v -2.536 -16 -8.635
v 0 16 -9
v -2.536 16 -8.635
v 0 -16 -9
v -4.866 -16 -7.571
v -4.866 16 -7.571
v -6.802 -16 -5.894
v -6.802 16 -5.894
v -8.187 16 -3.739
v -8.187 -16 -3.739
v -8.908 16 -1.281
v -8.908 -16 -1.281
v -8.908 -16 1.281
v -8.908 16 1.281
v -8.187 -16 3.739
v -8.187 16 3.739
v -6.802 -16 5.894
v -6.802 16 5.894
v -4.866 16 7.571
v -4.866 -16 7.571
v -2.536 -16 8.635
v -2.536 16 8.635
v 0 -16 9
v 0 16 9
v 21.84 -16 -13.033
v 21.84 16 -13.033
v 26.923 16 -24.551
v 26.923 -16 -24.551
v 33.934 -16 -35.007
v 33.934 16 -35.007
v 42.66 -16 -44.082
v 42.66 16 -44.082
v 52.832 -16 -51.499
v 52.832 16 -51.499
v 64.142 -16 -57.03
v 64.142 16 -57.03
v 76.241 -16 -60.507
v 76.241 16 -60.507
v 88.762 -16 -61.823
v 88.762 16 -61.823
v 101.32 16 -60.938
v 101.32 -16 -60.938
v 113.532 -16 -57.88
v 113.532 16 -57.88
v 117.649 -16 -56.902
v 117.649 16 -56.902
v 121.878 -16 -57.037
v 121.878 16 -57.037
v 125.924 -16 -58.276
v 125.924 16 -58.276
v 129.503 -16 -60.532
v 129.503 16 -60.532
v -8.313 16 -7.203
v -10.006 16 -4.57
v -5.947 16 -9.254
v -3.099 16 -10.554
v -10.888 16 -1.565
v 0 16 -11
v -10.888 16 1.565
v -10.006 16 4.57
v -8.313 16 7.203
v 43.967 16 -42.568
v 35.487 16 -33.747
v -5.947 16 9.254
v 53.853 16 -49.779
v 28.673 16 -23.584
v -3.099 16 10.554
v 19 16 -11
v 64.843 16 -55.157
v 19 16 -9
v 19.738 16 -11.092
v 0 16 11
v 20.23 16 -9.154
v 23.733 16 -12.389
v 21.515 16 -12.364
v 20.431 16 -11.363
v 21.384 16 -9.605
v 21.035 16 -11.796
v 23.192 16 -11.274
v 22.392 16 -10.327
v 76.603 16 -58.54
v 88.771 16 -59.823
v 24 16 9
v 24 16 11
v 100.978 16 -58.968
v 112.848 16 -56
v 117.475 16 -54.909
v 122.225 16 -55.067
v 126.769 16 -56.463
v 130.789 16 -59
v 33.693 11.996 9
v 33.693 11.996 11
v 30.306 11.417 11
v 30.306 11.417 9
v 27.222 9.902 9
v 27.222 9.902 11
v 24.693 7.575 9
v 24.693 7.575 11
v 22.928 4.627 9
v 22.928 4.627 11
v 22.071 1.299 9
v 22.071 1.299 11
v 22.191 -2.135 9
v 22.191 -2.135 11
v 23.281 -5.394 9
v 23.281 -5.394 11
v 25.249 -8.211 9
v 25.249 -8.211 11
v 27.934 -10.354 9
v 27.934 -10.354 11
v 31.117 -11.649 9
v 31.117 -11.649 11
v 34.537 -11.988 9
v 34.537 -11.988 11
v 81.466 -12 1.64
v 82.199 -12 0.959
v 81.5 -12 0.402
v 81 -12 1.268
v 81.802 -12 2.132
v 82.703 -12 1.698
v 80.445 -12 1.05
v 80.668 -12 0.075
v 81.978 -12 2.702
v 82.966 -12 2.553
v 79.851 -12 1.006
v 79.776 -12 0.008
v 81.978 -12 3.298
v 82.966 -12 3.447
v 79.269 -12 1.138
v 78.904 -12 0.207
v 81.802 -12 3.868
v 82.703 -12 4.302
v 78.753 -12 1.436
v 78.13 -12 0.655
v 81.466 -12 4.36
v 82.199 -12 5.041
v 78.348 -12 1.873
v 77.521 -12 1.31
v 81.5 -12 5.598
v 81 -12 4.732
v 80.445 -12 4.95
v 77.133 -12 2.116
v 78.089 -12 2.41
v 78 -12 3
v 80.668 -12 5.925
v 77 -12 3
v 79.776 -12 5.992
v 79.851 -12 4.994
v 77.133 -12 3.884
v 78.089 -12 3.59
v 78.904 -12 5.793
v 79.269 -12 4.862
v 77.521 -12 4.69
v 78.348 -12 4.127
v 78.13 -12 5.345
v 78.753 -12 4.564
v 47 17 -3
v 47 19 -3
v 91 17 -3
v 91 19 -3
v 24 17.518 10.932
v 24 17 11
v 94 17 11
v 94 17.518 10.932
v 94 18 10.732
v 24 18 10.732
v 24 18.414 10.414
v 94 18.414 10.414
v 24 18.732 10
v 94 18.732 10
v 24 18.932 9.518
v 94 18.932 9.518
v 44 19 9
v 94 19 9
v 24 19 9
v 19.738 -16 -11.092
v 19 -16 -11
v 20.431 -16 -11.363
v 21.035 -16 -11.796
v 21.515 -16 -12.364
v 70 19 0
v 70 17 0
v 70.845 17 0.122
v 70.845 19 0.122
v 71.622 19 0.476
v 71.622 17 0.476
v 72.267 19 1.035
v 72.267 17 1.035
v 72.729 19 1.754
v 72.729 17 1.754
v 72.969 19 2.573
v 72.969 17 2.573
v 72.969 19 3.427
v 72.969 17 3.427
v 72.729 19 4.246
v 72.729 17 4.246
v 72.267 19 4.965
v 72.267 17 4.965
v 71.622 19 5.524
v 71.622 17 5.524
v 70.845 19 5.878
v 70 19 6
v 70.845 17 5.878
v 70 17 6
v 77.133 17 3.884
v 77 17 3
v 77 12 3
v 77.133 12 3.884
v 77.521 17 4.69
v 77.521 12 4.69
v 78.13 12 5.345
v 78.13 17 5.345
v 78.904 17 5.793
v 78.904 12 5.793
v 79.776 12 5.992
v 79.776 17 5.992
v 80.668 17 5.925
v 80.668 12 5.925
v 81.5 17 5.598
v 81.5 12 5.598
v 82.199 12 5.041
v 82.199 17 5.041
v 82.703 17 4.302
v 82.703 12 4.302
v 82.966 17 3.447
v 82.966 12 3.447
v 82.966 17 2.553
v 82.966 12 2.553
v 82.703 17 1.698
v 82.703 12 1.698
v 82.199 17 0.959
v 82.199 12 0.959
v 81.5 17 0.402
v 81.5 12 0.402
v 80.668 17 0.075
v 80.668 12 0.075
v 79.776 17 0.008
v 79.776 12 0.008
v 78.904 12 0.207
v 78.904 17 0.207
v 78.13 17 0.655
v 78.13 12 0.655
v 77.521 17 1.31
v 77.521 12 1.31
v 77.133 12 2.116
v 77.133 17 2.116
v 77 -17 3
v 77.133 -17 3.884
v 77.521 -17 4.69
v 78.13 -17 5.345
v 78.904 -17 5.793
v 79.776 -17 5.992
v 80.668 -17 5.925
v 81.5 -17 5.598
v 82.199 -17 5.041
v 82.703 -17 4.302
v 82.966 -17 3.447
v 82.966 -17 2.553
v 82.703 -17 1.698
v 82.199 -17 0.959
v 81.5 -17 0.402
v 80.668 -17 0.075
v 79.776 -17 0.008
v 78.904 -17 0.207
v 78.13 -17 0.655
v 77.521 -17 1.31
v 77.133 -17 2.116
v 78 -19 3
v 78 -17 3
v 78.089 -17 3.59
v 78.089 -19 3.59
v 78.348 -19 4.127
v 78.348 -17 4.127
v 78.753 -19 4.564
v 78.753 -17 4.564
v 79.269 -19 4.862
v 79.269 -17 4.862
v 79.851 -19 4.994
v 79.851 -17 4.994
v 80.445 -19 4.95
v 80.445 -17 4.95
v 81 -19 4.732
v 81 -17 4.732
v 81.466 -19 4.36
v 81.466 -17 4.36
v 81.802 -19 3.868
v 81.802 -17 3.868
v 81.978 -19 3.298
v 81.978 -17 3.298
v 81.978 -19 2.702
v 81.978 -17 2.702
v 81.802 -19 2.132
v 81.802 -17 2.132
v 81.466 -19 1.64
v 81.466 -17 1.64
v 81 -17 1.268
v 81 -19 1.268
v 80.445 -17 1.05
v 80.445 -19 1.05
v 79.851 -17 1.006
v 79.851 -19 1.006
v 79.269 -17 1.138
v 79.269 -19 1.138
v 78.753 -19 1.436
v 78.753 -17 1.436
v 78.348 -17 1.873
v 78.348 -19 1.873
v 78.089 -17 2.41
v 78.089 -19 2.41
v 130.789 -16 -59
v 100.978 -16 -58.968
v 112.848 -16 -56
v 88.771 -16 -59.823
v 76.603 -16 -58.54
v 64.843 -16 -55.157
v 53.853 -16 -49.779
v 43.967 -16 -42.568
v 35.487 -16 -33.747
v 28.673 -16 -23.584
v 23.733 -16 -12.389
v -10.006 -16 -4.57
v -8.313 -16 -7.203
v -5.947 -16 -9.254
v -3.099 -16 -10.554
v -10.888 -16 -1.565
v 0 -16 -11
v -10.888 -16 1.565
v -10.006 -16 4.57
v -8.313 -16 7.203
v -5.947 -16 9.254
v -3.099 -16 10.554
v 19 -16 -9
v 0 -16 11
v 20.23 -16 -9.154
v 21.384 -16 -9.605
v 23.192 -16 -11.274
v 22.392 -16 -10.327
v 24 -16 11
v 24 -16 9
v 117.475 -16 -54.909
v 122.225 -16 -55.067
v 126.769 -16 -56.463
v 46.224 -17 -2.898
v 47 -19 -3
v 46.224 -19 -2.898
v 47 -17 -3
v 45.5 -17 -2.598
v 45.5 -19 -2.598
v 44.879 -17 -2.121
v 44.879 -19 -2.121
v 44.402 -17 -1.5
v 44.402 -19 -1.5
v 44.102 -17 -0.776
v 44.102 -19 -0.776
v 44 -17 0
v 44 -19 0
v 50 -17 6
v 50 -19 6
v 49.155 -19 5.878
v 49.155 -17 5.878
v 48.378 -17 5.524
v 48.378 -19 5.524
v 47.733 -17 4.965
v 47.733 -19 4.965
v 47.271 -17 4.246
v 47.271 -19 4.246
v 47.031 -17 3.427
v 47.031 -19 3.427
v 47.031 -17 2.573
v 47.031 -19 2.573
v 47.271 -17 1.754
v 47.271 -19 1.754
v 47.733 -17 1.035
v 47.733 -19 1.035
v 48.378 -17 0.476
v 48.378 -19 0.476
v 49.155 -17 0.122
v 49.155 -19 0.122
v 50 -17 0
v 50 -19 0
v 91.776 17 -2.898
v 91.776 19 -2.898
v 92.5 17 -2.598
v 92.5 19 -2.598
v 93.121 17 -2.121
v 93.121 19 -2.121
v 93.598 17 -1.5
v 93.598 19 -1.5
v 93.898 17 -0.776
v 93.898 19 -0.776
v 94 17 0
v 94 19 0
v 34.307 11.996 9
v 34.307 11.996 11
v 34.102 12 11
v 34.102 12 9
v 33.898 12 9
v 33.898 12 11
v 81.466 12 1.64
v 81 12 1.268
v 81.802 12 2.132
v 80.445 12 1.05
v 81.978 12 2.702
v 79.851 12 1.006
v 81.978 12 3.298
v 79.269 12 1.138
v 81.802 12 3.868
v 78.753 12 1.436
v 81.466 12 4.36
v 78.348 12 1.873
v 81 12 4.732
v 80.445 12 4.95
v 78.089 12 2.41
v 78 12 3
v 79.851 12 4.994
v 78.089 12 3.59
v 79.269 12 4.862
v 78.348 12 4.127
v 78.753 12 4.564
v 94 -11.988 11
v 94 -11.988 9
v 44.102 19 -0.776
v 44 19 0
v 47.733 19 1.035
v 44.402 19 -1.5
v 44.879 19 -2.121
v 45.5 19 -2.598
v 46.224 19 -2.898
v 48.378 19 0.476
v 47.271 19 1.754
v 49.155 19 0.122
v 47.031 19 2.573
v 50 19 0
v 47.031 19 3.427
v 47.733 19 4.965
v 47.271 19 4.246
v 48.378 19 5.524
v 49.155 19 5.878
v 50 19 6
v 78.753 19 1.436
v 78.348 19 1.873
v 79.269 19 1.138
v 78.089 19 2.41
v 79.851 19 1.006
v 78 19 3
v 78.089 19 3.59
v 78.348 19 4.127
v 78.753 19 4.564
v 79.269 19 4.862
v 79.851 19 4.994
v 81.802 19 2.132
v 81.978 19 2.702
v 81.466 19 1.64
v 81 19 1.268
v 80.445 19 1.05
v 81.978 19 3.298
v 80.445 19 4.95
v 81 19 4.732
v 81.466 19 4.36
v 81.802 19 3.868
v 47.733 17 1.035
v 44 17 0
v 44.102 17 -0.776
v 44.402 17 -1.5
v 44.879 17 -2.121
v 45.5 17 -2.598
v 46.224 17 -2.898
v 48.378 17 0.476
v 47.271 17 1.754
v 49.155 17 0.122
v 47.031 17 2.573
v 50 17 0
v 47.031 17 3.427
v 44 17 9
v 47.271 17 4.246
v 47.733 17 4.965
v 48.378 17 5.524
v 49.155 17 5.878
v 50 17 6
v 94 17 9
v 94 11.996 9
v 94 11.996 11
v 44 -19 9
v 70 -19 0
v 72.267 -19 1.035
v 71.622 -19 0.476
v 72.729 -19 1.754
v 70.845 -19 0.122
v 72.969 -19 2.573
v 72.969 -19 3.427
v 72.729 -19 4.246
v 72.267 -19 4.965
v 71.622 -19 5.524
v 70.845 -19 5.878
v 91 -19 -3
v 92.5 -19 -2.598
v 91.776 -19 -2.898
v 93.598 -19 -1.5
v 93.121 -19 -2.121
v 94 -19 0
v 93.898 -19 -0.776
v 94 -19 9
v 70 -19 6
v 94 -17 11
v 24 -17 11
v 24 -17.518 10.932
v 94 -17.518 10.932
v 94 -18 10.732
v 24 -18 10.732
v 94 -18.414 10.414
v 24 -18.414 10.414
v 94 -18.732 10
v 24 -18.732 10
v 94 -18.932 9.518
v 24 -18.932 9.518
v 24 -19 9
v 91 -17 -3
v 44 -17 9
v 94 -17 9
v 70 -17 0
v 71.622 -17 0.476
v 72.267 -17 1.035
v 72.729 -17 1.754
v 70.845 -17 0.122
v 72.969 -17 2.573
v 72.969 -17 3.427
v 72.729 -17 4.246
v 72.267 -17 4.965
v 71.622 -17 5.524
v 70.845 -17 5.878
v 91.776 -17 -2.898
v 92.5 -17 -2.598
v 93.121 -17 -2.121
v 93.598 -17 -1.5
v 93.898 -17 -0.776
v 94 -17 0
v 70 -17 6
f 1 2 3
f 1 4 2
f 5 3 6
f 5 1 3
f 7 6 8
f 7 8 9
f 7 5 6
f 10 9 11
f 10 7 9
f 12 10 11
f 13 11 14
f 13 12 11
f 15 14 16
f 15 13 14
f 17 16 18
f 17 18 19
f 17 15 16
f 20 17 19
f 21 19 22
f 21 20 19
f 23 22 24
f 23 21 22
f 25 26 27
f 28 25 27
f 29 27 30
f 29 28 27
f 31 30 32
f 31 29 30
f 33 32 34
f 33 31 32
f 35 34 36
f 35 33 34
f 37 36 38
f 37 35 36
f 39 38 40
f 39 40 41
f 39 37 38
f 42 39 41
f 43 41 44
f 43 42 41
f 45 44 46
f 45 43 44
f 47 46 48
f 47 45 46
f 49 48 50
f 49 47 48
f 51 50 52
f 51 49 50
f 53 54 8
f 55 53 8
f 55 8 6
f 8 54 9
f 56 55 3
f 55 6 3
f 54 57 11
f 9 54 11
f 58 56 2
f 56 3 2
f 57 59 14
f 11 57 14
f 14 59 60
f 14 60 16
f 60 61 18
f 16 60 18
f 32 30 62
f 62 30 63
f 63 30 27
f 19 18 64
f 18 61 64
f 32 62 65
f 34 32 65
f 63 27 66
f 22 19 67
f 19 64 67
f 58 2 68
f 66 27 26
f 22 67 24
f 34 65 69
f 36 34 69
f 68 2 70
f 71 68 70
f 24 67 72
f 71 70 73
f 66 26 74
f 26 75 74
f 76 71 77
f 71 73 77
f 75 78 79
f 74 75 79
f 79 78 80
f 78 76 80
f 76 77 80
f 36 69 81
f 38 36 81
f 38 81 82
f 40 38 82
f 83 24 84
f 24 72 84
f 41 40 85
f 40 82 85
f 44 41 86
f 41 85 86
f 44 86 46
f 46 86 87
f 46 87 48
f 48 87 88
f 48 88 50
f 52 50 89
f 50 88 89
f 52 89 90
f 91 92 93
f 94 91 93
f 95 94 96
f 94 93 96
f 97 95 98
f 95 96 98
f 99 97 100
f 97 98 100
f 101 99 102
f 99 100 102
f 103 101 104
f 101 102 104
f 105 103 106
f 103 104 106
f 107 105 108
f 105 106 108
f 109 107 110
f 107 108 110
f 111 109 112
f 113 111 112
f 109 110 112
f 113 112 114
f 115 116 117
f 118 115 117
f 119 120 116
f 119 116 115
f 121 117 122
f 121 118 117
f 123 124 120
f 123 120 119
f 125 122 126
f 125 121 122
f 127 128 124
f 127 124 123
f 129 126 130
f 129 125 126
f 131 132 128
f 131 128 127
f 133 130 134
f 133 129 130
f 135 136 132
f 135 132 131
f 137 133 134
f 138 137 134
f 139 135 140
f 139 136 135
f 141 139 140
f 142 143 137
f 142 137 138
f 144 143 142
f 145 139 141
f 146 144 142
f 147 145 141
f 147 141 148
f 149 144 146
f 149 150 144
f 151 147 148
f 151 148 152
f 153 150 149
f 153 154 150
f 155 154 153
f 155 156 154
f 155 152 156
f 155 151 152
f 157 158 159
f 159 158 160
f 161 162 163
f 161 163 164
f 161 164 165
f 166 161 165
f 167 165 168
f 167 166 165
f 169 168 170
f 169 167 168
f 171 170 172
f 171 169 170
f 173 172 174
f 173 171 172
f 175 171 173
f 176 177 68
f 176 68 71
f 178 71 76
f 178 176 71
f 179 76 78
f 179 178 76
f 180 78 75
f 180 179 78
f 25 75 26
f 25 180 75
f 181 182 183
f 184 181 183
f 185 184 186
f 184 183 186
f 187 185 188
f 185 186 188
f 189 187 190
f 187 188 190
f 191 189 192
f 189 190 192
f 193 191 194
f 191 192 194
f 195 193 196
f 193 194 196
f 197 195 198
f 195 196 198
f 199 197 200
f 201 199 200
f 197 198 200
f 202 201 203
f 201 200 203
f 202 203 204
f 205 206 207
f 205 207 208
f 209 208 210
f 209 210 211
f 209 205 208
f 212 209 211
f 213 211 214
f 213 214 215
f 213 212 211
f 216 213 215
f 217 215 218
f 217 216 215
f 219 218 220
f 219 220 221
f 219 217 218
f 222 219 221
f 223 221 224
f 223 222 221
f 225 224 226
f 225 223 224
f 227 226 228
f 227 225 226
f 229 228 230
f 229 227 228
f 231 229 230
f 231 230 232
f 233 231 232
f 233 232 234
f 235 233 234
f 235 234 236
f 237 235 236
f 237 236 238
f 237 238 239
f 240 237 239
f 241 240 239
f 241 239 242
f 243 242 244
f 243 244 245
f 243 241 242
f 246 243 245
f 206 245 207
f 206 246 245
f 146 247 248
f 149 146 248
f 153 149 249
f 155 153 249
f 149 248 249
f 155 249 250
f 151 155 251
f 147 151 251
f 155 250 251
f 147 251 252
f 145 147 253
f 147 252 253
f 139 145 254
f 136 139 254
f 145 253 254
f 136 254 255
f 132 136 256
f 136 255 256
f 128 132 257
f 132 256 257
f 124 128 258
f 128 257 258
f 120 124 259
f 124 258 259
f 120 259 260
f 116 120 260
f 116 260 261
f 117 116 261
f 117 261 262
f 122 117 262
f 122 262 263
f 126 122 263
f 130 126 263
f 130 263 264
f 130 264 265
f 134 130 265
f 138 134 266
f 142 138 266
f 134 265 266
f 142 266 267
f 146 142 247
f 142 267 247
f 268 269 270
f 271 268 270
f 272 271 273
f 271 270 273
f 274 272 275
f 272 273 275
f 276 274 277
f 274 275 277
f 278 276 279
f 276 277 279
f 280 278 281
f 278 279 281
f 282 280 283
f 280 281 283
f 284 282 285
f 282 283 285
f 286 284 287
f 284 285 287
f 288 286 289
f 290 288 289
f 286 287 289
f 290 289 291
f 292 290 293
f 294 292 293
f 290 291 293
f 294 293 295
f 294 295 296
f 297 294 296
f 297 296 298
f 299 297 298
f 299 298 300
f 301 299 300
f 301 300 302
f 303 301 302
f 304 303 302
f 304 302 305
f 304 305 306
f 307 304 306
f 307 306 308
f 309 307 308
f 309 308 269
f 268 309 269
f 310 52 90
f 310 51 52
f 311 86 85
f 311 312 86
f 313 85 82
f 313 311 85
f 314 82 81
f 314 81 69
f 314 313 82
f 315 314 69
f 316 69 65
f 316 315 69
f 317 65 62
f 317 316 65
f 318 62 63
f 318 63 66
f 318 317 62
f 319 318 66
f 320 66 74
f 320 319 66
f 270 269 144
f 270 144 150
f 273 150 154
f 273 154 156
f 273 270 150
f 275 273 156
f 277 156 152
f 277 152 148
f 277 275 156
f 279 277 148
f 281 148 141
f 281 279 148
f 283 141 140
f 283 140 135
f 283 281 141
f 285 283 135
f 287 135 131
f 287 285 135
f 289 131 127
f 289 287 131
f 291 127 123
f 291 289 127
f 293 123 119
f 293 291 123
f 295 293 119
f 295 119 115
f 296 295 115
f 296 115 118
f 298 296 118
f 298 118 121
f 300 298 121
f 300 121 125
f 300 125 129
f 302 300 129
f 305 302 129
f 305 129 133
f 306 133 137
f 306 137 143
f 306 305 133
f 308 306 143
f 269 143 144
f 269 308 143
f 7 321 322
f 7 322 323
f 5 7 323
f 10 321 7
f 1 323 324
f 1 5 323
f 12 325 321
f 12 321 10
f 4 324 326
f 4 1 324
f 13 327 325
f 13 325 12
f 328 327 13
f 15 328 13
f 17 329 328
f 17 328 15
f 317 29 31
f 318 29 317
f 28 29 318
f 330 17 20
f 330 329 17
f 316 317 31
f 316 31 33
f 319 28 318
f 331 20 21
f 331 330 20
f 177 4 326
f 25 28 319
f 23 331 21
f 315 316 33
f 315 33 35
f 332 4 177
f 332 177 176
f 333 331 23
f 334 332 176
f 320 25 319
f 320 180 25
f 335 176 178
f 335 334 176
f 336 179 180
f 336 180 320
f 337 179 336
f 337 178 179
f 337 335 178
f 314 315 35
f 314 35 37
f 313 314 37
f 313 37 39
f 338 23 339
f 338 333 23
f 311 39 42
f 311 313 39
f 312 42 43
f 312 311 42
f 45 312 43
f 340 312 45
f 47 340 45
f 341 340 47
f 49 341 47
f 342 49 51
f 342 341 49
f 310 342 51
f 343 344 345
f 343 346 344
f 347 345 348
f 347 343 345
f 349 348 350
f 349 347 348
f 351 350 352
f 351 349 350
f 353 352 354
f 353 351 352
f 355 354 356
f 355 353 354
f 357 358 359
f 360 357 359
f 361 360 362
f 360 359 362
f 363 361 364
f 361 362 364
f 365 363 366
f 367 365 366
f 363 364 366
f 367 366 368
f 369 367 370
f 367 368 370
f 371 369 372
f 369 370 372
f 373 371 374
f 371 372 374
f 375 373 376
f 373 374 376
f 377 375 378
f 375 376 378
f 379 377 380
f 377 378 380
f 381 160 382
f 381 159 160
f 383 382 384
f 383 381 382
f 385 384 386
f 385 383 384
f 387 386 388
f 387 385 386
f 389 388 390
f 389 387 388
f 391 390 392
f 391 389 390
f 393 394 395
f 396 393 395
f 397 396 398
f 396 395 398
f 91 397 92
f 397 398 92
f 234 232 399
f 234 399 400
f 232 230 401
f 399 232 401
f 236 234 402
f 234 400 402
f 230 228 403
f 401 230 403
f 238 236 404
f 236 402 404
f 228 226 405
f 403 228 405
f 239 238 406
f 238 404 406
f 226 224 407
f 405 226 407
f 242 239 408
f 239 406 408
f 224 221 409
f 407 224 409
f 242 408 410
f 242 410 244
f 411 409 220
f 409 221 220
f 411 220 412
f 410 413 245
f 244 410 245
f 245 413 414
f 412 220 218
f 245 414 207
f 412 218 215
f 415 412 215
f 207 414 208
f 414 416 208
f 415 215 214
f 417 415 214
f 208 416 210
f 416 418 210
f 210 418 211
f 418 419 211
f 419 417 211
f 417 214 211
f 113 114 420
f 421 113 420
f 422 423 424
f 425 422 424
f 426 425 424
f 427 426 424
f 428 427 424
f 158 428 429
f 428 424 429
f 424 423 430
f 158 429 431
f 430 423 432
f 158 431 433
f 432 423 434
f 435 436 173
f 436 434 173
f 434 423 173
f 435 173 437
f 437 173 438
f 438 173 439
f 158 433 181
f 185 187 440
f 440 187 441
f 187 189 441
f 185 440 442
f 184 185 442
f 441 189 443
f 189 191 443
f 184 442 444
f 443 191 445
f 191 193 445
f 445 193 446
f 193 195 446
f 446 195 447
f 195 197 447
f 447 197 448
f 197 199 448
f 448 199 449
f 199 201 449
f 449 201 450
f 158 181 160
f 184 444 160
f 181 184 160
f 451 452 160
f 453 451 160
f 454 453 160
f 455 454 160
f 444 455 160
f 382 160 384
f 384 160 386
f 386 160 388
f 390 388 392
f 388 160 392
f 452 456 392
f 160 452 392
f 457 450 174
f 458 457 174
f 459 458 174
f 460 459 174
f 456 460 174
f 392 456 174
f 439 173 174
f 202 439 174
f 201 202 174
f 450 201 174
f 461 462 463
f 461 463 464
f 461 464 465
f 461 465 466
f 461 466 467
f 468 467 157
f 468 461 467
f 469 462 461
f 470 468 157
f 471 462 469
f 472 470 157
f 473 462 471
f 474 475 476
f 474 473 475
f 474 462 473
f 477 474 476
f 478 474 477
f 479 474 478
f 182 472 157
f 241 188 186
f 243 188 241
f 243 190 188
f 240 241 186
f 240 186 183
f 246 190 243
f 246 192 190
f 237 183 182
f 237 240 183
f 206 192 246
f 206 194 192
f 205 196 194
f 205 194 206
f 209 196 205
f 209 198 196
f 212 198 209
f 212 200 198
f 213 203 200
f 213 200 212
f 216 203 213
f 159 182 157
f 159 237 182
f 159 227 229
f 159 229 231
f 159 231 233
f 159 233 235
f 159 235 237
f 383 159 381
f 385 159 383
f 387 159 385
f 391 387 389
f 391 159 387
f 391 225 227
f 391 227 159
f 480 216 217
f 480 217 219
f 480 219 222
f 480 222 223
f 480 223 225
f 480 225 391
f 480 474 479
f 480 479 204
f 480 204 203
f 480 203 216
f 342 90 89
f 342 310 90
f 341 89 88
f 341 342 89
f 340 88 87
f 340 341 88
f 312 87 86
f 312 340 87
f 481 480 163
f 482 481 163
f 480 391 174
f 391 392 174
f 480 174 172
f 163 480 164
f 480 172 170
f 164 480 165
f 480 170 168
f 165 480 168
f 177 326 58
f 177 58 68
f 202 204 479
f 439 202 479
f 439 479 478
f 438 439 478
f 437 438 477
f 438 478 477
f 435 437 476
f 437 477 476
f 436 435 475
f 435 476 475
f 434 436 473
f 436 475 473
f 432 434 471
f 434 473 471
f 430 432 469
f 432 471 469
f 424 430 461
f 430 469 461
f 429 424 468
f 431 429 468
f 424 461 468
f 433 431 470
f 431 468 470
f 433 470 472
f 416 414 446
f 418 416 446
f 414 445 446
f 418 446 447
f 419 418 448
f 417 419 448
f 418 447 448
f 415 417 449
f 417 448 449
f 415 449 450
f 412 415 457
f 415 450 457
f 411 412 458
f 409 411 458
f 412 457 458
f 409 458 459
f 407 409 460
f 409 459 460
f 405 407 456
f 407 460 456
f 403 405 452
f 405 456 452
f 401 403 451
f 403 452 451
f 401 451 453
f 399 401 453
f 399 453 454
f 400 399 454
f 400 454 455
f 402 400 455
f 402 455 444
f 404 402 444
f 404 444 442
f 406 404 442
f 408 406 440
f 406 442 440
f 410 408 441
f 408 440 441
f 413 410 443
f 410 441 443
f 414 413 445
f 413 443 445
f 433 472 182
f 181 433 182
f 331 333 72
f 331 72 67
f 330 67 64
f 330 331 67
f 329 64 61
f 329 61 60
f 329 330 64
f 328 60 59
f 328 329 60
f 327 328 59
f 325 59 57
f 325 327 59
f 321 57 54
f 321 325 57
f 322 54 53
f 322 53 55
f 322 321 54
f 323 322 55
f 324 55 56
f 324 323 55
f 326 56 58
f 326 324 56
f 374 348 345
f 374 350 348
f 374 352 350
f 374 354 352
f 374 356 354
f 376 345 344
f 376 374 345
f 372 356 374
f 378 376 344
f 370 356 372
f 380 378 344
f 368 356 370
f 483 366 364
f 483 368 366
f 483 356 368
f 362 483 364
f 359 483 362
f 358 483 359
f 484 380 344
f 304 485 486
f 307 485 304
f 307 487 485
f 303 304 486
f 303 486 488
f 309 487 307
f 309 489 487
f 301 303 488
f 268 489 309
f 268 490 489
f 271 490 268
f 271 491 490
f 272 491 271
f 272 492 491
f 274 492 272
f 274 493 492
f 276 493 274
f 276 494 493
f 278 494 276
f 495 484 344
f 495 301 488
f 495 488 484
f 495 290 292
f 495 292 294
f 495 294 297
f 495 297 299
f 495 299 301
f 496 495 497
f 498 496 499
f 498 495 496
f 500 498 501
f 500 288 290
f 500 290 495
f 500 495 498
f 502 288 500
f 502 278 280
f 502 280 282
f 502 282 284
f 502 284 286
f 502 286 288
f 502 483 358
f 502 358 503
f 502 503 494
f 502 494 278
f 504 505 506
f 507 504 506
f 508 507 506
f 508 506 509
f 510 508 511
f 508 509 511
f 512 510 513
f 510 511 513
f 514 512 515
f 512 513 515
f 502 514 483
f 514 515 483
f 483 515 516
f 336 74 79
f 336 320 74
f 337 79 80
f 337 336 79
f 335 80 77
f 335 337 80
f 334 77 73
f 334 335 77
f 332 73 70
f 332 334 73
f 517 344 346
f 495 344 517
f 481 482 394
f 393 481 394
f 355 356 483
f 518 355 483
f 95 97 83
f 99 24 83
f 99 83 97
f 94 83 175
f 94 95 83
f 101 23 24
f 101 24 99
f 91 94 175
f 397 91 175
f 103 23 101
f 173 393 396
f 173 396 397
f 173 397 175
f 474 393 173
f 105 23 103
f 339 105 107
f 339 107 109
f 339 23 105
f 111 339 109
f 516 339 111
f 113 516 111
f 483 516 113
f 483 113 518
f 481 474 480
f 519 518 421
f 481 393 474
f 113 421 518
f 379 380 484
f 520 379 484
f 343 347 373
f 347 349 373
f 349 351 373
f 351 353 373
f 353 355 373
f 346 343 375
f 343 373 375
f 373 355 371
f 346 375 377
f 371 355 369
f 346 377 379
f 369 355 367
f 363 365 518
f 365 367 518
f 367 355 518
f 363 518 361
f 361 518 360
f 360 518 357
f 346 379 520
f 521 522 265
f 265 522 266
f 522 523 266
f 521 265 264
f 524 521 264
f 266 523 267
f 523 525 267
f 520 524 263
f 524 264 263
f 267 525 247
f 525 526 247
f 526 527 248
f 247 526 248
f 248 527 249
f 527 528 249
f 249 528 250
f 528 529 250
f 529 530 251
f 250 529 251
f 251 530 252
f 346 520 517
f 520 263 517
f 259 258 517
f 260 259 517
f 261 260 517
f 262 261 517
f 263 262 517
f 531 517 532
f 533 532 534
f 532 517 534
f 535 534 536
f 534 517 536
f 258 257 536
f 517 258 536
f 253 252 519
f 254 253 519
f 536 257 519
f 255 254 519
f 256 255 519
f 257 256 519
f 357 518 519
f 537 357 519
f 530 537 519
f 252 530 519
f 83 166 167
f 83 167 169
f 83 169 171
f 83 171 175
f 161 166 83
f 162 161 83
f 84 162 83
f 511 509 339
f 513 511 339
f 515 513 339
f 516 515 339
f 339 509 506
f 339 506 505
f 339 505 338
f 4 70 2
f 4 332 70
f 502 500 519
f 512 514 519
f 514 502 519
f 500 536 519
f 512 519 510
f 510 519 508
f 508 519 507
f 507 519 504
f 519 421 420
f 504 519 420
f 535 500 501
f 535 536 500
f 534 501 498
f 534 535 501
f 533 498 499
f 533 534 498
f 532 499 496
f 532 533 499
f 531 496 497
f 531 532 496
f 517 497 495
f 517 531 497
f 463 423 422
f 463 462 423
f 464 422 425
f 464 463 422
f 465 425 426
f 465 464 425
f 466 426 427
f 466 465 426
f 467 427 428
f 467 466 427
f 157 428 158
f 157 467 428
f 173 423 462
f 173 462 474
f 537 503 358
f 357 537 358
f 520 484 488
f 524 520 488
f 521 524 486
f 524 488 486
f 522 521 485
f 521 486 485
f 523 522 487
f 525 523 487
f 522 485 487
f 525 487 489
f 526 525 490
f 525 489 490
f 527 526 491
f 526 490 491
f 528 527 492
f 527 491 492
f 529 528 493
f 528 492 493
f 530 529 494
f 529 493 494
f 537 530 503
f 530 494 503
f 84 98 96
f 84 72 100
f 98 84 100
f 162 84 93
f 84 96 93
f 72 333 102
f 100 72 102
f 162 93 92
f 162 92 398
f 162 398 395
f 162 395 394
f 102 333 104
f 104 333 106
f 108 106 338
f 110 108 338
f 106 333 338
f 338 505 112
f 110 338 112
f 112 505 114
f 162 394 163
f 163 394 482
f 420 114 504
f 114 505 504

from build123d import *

# Parameters (mm, degrees)
F1_DEPTH  = 16
F2_W      = 70
F2_H      = 3
F3_DEPTH  = 2
F4_W      = 50
F4_H      = 14
F5_DEPTH  = 2
F6_R      = 2
F9_DEPTH  = 2
F11_DEPTH = 38.001
F13_D     = 4
F14_R     = 3
F14_R_2   = 2
F15_DEPTH = 5
F16_R     = 3


# Not quite as in the source:
# - a pattern or mirror of a feature is missing from the dataset's text; its kind, count and spacing are read off the source's solid


with BuildPart() as f1:
    # F0 (on Front) → F1 (new body)
    with BuildSketch(Plane.XZ):
        with BuildLine():
            ThreePointArc((0, -9), (-9, 0), (0, 9))
            Line((0, 9), (94, 9))
            Line((94, 9), (94, 11))
            Line((94, 11), (0, 11))
            ThreePointArc((0, 11), (-11, 0), (0, -11))
            Line((0, -11), (19, -11))
            ThreePointArc((19, -11), (20.7464347921, -11.5607448848), (21.84, -13.0333563221))
            ThreePointArc((21.84, -13.0333563221), (58.3659358906, -54.5122350868), (113.5320571839, -57.8797917247))
            ThreePointArc((113.5320571839, -57.8797917247), (121.8779484376, -57.0367571838), (129.5033807995, -60.5320954149))
            Line((129.5033807995, -60.5320954149), (130.788961497, -59))
            ThreePointArc((130.788961497, -59), (122.2254958147, -55.0670941025), (112.8483757943, -56))
            ThreePointArc((112.8483757943, -56), (59.2303979034, -52.7086373708), (23.7333333333, -12.3889272035))
            ThreePointArc((23.7333333333, -12.3889272035), (21.9107246536, -9.9345748081), (19, -9))
            Line((19, -9), (0, -9))
        make_face()
    extrude(amount=F1_DEPTH)

    # F2 (on face) → F3 (join)
    with BuildSketch(Plane.XY.offset(11)):
        with Locations((59, -17.5)):
            Rectangle(F2_W, F2_H)
    extrude(amount=-F3_DEPTH)

    # F4 (on face) → F5 (join)
    with BuildSketch(Plane.XZ.offset(19)):
        with Locations((69, 4)):
            Rectangle(F4_W, F4_H)
    extrude(amount=-F5_DEPTH)

    # F6
    f6_edges = [f1.edges().sort_by_distance(p)[0] for p in [
        (59, -19, 11),
    ]]
    fillet(f6_edges, radius=F6_R)

    # F7: F1 across plane


with BuildPart() as f1_1:
    add(f1.part)
    add(f1.part.mirror(Plane.XZ))

    # F8 (on face) → F9 (cut)
    with BuildSketch(Plane.XY.offset(11)):
        with BuildLine():
            Line((33.6929396674, 11.9960707714), (34.3070603326, 11.9960707714))
            ThreePointArc((34.3070603326, 11.9960707714), (34, 12), (33.6929396674, 11.9960707714))
        make_face()
        with BuildLine():
            Line((94, 11.9960707714), (34.3070603326, 11.9960707714))
            Line((34.3070603326, 11.9960707714), (33.6929396674, 11.9960707714))
            ThreePointArc((33.6929396674, 11.9960707714), (22.0074226206, -0.4220045025), (34.5369099172, -11.9879826385))
            Line((34.5369099172, -11.9879826385), (94, -11.9879826385))
            Line((94, -11.9879826385), (94, 11.9960707714))
        make_face()
    extrude(amount=-F9_DEPTH, mode=Mode.SUBTRACT)

    # F10 (on face) → F11 (cut, through all)
    with BuildSketch(Plane.XZ.offset(19)):
        with BuildLine():
            ThreePointArc((50, 6), (47, 3), (50, 0))
            Line((50, 0), (70, 0))
            ThreePointArc((70, 0), (73, 3), (70, 6))
            Line((70, 6), (50, 6))
        make_face()
    extrude(amount=-F11_DEPTH, mode=Mode.SUBTRACT)

    # F13 (through all)
    with Locations(Plane.XZ.offset(19)):
        with Locations((80, 3)):
            Hole(F13_D / 2)

    # F14 (on face) → F15 (join)
    with BuildSketch(Plane(origin=(0, -17, 0), x_dir=(-1, 0, 0), z_dir=(0, 1, 0))):
        with Locations((-80, 3)):
            Circle(F14_R)
        with Locations((-80, 3)):
            Circle(F14_R_2, mode=Mode.SUBTRACT)
    f15 = extrude(amount=F15_DEPTH)

    # F15_copies: F15 across plane
    add(f15.mirror(Plane.ZX))

    # F16
    f16_edges = [f1_1.edges().sort_by_distance(p)[0] for p in [
        (44, 18, -3),
        (44, -18, -3),
        (94, 18, -3),
        (94, -18, -3),
    ]]
    fillet(f16_edges, radius=F16_R)


solid = f1_1.part
